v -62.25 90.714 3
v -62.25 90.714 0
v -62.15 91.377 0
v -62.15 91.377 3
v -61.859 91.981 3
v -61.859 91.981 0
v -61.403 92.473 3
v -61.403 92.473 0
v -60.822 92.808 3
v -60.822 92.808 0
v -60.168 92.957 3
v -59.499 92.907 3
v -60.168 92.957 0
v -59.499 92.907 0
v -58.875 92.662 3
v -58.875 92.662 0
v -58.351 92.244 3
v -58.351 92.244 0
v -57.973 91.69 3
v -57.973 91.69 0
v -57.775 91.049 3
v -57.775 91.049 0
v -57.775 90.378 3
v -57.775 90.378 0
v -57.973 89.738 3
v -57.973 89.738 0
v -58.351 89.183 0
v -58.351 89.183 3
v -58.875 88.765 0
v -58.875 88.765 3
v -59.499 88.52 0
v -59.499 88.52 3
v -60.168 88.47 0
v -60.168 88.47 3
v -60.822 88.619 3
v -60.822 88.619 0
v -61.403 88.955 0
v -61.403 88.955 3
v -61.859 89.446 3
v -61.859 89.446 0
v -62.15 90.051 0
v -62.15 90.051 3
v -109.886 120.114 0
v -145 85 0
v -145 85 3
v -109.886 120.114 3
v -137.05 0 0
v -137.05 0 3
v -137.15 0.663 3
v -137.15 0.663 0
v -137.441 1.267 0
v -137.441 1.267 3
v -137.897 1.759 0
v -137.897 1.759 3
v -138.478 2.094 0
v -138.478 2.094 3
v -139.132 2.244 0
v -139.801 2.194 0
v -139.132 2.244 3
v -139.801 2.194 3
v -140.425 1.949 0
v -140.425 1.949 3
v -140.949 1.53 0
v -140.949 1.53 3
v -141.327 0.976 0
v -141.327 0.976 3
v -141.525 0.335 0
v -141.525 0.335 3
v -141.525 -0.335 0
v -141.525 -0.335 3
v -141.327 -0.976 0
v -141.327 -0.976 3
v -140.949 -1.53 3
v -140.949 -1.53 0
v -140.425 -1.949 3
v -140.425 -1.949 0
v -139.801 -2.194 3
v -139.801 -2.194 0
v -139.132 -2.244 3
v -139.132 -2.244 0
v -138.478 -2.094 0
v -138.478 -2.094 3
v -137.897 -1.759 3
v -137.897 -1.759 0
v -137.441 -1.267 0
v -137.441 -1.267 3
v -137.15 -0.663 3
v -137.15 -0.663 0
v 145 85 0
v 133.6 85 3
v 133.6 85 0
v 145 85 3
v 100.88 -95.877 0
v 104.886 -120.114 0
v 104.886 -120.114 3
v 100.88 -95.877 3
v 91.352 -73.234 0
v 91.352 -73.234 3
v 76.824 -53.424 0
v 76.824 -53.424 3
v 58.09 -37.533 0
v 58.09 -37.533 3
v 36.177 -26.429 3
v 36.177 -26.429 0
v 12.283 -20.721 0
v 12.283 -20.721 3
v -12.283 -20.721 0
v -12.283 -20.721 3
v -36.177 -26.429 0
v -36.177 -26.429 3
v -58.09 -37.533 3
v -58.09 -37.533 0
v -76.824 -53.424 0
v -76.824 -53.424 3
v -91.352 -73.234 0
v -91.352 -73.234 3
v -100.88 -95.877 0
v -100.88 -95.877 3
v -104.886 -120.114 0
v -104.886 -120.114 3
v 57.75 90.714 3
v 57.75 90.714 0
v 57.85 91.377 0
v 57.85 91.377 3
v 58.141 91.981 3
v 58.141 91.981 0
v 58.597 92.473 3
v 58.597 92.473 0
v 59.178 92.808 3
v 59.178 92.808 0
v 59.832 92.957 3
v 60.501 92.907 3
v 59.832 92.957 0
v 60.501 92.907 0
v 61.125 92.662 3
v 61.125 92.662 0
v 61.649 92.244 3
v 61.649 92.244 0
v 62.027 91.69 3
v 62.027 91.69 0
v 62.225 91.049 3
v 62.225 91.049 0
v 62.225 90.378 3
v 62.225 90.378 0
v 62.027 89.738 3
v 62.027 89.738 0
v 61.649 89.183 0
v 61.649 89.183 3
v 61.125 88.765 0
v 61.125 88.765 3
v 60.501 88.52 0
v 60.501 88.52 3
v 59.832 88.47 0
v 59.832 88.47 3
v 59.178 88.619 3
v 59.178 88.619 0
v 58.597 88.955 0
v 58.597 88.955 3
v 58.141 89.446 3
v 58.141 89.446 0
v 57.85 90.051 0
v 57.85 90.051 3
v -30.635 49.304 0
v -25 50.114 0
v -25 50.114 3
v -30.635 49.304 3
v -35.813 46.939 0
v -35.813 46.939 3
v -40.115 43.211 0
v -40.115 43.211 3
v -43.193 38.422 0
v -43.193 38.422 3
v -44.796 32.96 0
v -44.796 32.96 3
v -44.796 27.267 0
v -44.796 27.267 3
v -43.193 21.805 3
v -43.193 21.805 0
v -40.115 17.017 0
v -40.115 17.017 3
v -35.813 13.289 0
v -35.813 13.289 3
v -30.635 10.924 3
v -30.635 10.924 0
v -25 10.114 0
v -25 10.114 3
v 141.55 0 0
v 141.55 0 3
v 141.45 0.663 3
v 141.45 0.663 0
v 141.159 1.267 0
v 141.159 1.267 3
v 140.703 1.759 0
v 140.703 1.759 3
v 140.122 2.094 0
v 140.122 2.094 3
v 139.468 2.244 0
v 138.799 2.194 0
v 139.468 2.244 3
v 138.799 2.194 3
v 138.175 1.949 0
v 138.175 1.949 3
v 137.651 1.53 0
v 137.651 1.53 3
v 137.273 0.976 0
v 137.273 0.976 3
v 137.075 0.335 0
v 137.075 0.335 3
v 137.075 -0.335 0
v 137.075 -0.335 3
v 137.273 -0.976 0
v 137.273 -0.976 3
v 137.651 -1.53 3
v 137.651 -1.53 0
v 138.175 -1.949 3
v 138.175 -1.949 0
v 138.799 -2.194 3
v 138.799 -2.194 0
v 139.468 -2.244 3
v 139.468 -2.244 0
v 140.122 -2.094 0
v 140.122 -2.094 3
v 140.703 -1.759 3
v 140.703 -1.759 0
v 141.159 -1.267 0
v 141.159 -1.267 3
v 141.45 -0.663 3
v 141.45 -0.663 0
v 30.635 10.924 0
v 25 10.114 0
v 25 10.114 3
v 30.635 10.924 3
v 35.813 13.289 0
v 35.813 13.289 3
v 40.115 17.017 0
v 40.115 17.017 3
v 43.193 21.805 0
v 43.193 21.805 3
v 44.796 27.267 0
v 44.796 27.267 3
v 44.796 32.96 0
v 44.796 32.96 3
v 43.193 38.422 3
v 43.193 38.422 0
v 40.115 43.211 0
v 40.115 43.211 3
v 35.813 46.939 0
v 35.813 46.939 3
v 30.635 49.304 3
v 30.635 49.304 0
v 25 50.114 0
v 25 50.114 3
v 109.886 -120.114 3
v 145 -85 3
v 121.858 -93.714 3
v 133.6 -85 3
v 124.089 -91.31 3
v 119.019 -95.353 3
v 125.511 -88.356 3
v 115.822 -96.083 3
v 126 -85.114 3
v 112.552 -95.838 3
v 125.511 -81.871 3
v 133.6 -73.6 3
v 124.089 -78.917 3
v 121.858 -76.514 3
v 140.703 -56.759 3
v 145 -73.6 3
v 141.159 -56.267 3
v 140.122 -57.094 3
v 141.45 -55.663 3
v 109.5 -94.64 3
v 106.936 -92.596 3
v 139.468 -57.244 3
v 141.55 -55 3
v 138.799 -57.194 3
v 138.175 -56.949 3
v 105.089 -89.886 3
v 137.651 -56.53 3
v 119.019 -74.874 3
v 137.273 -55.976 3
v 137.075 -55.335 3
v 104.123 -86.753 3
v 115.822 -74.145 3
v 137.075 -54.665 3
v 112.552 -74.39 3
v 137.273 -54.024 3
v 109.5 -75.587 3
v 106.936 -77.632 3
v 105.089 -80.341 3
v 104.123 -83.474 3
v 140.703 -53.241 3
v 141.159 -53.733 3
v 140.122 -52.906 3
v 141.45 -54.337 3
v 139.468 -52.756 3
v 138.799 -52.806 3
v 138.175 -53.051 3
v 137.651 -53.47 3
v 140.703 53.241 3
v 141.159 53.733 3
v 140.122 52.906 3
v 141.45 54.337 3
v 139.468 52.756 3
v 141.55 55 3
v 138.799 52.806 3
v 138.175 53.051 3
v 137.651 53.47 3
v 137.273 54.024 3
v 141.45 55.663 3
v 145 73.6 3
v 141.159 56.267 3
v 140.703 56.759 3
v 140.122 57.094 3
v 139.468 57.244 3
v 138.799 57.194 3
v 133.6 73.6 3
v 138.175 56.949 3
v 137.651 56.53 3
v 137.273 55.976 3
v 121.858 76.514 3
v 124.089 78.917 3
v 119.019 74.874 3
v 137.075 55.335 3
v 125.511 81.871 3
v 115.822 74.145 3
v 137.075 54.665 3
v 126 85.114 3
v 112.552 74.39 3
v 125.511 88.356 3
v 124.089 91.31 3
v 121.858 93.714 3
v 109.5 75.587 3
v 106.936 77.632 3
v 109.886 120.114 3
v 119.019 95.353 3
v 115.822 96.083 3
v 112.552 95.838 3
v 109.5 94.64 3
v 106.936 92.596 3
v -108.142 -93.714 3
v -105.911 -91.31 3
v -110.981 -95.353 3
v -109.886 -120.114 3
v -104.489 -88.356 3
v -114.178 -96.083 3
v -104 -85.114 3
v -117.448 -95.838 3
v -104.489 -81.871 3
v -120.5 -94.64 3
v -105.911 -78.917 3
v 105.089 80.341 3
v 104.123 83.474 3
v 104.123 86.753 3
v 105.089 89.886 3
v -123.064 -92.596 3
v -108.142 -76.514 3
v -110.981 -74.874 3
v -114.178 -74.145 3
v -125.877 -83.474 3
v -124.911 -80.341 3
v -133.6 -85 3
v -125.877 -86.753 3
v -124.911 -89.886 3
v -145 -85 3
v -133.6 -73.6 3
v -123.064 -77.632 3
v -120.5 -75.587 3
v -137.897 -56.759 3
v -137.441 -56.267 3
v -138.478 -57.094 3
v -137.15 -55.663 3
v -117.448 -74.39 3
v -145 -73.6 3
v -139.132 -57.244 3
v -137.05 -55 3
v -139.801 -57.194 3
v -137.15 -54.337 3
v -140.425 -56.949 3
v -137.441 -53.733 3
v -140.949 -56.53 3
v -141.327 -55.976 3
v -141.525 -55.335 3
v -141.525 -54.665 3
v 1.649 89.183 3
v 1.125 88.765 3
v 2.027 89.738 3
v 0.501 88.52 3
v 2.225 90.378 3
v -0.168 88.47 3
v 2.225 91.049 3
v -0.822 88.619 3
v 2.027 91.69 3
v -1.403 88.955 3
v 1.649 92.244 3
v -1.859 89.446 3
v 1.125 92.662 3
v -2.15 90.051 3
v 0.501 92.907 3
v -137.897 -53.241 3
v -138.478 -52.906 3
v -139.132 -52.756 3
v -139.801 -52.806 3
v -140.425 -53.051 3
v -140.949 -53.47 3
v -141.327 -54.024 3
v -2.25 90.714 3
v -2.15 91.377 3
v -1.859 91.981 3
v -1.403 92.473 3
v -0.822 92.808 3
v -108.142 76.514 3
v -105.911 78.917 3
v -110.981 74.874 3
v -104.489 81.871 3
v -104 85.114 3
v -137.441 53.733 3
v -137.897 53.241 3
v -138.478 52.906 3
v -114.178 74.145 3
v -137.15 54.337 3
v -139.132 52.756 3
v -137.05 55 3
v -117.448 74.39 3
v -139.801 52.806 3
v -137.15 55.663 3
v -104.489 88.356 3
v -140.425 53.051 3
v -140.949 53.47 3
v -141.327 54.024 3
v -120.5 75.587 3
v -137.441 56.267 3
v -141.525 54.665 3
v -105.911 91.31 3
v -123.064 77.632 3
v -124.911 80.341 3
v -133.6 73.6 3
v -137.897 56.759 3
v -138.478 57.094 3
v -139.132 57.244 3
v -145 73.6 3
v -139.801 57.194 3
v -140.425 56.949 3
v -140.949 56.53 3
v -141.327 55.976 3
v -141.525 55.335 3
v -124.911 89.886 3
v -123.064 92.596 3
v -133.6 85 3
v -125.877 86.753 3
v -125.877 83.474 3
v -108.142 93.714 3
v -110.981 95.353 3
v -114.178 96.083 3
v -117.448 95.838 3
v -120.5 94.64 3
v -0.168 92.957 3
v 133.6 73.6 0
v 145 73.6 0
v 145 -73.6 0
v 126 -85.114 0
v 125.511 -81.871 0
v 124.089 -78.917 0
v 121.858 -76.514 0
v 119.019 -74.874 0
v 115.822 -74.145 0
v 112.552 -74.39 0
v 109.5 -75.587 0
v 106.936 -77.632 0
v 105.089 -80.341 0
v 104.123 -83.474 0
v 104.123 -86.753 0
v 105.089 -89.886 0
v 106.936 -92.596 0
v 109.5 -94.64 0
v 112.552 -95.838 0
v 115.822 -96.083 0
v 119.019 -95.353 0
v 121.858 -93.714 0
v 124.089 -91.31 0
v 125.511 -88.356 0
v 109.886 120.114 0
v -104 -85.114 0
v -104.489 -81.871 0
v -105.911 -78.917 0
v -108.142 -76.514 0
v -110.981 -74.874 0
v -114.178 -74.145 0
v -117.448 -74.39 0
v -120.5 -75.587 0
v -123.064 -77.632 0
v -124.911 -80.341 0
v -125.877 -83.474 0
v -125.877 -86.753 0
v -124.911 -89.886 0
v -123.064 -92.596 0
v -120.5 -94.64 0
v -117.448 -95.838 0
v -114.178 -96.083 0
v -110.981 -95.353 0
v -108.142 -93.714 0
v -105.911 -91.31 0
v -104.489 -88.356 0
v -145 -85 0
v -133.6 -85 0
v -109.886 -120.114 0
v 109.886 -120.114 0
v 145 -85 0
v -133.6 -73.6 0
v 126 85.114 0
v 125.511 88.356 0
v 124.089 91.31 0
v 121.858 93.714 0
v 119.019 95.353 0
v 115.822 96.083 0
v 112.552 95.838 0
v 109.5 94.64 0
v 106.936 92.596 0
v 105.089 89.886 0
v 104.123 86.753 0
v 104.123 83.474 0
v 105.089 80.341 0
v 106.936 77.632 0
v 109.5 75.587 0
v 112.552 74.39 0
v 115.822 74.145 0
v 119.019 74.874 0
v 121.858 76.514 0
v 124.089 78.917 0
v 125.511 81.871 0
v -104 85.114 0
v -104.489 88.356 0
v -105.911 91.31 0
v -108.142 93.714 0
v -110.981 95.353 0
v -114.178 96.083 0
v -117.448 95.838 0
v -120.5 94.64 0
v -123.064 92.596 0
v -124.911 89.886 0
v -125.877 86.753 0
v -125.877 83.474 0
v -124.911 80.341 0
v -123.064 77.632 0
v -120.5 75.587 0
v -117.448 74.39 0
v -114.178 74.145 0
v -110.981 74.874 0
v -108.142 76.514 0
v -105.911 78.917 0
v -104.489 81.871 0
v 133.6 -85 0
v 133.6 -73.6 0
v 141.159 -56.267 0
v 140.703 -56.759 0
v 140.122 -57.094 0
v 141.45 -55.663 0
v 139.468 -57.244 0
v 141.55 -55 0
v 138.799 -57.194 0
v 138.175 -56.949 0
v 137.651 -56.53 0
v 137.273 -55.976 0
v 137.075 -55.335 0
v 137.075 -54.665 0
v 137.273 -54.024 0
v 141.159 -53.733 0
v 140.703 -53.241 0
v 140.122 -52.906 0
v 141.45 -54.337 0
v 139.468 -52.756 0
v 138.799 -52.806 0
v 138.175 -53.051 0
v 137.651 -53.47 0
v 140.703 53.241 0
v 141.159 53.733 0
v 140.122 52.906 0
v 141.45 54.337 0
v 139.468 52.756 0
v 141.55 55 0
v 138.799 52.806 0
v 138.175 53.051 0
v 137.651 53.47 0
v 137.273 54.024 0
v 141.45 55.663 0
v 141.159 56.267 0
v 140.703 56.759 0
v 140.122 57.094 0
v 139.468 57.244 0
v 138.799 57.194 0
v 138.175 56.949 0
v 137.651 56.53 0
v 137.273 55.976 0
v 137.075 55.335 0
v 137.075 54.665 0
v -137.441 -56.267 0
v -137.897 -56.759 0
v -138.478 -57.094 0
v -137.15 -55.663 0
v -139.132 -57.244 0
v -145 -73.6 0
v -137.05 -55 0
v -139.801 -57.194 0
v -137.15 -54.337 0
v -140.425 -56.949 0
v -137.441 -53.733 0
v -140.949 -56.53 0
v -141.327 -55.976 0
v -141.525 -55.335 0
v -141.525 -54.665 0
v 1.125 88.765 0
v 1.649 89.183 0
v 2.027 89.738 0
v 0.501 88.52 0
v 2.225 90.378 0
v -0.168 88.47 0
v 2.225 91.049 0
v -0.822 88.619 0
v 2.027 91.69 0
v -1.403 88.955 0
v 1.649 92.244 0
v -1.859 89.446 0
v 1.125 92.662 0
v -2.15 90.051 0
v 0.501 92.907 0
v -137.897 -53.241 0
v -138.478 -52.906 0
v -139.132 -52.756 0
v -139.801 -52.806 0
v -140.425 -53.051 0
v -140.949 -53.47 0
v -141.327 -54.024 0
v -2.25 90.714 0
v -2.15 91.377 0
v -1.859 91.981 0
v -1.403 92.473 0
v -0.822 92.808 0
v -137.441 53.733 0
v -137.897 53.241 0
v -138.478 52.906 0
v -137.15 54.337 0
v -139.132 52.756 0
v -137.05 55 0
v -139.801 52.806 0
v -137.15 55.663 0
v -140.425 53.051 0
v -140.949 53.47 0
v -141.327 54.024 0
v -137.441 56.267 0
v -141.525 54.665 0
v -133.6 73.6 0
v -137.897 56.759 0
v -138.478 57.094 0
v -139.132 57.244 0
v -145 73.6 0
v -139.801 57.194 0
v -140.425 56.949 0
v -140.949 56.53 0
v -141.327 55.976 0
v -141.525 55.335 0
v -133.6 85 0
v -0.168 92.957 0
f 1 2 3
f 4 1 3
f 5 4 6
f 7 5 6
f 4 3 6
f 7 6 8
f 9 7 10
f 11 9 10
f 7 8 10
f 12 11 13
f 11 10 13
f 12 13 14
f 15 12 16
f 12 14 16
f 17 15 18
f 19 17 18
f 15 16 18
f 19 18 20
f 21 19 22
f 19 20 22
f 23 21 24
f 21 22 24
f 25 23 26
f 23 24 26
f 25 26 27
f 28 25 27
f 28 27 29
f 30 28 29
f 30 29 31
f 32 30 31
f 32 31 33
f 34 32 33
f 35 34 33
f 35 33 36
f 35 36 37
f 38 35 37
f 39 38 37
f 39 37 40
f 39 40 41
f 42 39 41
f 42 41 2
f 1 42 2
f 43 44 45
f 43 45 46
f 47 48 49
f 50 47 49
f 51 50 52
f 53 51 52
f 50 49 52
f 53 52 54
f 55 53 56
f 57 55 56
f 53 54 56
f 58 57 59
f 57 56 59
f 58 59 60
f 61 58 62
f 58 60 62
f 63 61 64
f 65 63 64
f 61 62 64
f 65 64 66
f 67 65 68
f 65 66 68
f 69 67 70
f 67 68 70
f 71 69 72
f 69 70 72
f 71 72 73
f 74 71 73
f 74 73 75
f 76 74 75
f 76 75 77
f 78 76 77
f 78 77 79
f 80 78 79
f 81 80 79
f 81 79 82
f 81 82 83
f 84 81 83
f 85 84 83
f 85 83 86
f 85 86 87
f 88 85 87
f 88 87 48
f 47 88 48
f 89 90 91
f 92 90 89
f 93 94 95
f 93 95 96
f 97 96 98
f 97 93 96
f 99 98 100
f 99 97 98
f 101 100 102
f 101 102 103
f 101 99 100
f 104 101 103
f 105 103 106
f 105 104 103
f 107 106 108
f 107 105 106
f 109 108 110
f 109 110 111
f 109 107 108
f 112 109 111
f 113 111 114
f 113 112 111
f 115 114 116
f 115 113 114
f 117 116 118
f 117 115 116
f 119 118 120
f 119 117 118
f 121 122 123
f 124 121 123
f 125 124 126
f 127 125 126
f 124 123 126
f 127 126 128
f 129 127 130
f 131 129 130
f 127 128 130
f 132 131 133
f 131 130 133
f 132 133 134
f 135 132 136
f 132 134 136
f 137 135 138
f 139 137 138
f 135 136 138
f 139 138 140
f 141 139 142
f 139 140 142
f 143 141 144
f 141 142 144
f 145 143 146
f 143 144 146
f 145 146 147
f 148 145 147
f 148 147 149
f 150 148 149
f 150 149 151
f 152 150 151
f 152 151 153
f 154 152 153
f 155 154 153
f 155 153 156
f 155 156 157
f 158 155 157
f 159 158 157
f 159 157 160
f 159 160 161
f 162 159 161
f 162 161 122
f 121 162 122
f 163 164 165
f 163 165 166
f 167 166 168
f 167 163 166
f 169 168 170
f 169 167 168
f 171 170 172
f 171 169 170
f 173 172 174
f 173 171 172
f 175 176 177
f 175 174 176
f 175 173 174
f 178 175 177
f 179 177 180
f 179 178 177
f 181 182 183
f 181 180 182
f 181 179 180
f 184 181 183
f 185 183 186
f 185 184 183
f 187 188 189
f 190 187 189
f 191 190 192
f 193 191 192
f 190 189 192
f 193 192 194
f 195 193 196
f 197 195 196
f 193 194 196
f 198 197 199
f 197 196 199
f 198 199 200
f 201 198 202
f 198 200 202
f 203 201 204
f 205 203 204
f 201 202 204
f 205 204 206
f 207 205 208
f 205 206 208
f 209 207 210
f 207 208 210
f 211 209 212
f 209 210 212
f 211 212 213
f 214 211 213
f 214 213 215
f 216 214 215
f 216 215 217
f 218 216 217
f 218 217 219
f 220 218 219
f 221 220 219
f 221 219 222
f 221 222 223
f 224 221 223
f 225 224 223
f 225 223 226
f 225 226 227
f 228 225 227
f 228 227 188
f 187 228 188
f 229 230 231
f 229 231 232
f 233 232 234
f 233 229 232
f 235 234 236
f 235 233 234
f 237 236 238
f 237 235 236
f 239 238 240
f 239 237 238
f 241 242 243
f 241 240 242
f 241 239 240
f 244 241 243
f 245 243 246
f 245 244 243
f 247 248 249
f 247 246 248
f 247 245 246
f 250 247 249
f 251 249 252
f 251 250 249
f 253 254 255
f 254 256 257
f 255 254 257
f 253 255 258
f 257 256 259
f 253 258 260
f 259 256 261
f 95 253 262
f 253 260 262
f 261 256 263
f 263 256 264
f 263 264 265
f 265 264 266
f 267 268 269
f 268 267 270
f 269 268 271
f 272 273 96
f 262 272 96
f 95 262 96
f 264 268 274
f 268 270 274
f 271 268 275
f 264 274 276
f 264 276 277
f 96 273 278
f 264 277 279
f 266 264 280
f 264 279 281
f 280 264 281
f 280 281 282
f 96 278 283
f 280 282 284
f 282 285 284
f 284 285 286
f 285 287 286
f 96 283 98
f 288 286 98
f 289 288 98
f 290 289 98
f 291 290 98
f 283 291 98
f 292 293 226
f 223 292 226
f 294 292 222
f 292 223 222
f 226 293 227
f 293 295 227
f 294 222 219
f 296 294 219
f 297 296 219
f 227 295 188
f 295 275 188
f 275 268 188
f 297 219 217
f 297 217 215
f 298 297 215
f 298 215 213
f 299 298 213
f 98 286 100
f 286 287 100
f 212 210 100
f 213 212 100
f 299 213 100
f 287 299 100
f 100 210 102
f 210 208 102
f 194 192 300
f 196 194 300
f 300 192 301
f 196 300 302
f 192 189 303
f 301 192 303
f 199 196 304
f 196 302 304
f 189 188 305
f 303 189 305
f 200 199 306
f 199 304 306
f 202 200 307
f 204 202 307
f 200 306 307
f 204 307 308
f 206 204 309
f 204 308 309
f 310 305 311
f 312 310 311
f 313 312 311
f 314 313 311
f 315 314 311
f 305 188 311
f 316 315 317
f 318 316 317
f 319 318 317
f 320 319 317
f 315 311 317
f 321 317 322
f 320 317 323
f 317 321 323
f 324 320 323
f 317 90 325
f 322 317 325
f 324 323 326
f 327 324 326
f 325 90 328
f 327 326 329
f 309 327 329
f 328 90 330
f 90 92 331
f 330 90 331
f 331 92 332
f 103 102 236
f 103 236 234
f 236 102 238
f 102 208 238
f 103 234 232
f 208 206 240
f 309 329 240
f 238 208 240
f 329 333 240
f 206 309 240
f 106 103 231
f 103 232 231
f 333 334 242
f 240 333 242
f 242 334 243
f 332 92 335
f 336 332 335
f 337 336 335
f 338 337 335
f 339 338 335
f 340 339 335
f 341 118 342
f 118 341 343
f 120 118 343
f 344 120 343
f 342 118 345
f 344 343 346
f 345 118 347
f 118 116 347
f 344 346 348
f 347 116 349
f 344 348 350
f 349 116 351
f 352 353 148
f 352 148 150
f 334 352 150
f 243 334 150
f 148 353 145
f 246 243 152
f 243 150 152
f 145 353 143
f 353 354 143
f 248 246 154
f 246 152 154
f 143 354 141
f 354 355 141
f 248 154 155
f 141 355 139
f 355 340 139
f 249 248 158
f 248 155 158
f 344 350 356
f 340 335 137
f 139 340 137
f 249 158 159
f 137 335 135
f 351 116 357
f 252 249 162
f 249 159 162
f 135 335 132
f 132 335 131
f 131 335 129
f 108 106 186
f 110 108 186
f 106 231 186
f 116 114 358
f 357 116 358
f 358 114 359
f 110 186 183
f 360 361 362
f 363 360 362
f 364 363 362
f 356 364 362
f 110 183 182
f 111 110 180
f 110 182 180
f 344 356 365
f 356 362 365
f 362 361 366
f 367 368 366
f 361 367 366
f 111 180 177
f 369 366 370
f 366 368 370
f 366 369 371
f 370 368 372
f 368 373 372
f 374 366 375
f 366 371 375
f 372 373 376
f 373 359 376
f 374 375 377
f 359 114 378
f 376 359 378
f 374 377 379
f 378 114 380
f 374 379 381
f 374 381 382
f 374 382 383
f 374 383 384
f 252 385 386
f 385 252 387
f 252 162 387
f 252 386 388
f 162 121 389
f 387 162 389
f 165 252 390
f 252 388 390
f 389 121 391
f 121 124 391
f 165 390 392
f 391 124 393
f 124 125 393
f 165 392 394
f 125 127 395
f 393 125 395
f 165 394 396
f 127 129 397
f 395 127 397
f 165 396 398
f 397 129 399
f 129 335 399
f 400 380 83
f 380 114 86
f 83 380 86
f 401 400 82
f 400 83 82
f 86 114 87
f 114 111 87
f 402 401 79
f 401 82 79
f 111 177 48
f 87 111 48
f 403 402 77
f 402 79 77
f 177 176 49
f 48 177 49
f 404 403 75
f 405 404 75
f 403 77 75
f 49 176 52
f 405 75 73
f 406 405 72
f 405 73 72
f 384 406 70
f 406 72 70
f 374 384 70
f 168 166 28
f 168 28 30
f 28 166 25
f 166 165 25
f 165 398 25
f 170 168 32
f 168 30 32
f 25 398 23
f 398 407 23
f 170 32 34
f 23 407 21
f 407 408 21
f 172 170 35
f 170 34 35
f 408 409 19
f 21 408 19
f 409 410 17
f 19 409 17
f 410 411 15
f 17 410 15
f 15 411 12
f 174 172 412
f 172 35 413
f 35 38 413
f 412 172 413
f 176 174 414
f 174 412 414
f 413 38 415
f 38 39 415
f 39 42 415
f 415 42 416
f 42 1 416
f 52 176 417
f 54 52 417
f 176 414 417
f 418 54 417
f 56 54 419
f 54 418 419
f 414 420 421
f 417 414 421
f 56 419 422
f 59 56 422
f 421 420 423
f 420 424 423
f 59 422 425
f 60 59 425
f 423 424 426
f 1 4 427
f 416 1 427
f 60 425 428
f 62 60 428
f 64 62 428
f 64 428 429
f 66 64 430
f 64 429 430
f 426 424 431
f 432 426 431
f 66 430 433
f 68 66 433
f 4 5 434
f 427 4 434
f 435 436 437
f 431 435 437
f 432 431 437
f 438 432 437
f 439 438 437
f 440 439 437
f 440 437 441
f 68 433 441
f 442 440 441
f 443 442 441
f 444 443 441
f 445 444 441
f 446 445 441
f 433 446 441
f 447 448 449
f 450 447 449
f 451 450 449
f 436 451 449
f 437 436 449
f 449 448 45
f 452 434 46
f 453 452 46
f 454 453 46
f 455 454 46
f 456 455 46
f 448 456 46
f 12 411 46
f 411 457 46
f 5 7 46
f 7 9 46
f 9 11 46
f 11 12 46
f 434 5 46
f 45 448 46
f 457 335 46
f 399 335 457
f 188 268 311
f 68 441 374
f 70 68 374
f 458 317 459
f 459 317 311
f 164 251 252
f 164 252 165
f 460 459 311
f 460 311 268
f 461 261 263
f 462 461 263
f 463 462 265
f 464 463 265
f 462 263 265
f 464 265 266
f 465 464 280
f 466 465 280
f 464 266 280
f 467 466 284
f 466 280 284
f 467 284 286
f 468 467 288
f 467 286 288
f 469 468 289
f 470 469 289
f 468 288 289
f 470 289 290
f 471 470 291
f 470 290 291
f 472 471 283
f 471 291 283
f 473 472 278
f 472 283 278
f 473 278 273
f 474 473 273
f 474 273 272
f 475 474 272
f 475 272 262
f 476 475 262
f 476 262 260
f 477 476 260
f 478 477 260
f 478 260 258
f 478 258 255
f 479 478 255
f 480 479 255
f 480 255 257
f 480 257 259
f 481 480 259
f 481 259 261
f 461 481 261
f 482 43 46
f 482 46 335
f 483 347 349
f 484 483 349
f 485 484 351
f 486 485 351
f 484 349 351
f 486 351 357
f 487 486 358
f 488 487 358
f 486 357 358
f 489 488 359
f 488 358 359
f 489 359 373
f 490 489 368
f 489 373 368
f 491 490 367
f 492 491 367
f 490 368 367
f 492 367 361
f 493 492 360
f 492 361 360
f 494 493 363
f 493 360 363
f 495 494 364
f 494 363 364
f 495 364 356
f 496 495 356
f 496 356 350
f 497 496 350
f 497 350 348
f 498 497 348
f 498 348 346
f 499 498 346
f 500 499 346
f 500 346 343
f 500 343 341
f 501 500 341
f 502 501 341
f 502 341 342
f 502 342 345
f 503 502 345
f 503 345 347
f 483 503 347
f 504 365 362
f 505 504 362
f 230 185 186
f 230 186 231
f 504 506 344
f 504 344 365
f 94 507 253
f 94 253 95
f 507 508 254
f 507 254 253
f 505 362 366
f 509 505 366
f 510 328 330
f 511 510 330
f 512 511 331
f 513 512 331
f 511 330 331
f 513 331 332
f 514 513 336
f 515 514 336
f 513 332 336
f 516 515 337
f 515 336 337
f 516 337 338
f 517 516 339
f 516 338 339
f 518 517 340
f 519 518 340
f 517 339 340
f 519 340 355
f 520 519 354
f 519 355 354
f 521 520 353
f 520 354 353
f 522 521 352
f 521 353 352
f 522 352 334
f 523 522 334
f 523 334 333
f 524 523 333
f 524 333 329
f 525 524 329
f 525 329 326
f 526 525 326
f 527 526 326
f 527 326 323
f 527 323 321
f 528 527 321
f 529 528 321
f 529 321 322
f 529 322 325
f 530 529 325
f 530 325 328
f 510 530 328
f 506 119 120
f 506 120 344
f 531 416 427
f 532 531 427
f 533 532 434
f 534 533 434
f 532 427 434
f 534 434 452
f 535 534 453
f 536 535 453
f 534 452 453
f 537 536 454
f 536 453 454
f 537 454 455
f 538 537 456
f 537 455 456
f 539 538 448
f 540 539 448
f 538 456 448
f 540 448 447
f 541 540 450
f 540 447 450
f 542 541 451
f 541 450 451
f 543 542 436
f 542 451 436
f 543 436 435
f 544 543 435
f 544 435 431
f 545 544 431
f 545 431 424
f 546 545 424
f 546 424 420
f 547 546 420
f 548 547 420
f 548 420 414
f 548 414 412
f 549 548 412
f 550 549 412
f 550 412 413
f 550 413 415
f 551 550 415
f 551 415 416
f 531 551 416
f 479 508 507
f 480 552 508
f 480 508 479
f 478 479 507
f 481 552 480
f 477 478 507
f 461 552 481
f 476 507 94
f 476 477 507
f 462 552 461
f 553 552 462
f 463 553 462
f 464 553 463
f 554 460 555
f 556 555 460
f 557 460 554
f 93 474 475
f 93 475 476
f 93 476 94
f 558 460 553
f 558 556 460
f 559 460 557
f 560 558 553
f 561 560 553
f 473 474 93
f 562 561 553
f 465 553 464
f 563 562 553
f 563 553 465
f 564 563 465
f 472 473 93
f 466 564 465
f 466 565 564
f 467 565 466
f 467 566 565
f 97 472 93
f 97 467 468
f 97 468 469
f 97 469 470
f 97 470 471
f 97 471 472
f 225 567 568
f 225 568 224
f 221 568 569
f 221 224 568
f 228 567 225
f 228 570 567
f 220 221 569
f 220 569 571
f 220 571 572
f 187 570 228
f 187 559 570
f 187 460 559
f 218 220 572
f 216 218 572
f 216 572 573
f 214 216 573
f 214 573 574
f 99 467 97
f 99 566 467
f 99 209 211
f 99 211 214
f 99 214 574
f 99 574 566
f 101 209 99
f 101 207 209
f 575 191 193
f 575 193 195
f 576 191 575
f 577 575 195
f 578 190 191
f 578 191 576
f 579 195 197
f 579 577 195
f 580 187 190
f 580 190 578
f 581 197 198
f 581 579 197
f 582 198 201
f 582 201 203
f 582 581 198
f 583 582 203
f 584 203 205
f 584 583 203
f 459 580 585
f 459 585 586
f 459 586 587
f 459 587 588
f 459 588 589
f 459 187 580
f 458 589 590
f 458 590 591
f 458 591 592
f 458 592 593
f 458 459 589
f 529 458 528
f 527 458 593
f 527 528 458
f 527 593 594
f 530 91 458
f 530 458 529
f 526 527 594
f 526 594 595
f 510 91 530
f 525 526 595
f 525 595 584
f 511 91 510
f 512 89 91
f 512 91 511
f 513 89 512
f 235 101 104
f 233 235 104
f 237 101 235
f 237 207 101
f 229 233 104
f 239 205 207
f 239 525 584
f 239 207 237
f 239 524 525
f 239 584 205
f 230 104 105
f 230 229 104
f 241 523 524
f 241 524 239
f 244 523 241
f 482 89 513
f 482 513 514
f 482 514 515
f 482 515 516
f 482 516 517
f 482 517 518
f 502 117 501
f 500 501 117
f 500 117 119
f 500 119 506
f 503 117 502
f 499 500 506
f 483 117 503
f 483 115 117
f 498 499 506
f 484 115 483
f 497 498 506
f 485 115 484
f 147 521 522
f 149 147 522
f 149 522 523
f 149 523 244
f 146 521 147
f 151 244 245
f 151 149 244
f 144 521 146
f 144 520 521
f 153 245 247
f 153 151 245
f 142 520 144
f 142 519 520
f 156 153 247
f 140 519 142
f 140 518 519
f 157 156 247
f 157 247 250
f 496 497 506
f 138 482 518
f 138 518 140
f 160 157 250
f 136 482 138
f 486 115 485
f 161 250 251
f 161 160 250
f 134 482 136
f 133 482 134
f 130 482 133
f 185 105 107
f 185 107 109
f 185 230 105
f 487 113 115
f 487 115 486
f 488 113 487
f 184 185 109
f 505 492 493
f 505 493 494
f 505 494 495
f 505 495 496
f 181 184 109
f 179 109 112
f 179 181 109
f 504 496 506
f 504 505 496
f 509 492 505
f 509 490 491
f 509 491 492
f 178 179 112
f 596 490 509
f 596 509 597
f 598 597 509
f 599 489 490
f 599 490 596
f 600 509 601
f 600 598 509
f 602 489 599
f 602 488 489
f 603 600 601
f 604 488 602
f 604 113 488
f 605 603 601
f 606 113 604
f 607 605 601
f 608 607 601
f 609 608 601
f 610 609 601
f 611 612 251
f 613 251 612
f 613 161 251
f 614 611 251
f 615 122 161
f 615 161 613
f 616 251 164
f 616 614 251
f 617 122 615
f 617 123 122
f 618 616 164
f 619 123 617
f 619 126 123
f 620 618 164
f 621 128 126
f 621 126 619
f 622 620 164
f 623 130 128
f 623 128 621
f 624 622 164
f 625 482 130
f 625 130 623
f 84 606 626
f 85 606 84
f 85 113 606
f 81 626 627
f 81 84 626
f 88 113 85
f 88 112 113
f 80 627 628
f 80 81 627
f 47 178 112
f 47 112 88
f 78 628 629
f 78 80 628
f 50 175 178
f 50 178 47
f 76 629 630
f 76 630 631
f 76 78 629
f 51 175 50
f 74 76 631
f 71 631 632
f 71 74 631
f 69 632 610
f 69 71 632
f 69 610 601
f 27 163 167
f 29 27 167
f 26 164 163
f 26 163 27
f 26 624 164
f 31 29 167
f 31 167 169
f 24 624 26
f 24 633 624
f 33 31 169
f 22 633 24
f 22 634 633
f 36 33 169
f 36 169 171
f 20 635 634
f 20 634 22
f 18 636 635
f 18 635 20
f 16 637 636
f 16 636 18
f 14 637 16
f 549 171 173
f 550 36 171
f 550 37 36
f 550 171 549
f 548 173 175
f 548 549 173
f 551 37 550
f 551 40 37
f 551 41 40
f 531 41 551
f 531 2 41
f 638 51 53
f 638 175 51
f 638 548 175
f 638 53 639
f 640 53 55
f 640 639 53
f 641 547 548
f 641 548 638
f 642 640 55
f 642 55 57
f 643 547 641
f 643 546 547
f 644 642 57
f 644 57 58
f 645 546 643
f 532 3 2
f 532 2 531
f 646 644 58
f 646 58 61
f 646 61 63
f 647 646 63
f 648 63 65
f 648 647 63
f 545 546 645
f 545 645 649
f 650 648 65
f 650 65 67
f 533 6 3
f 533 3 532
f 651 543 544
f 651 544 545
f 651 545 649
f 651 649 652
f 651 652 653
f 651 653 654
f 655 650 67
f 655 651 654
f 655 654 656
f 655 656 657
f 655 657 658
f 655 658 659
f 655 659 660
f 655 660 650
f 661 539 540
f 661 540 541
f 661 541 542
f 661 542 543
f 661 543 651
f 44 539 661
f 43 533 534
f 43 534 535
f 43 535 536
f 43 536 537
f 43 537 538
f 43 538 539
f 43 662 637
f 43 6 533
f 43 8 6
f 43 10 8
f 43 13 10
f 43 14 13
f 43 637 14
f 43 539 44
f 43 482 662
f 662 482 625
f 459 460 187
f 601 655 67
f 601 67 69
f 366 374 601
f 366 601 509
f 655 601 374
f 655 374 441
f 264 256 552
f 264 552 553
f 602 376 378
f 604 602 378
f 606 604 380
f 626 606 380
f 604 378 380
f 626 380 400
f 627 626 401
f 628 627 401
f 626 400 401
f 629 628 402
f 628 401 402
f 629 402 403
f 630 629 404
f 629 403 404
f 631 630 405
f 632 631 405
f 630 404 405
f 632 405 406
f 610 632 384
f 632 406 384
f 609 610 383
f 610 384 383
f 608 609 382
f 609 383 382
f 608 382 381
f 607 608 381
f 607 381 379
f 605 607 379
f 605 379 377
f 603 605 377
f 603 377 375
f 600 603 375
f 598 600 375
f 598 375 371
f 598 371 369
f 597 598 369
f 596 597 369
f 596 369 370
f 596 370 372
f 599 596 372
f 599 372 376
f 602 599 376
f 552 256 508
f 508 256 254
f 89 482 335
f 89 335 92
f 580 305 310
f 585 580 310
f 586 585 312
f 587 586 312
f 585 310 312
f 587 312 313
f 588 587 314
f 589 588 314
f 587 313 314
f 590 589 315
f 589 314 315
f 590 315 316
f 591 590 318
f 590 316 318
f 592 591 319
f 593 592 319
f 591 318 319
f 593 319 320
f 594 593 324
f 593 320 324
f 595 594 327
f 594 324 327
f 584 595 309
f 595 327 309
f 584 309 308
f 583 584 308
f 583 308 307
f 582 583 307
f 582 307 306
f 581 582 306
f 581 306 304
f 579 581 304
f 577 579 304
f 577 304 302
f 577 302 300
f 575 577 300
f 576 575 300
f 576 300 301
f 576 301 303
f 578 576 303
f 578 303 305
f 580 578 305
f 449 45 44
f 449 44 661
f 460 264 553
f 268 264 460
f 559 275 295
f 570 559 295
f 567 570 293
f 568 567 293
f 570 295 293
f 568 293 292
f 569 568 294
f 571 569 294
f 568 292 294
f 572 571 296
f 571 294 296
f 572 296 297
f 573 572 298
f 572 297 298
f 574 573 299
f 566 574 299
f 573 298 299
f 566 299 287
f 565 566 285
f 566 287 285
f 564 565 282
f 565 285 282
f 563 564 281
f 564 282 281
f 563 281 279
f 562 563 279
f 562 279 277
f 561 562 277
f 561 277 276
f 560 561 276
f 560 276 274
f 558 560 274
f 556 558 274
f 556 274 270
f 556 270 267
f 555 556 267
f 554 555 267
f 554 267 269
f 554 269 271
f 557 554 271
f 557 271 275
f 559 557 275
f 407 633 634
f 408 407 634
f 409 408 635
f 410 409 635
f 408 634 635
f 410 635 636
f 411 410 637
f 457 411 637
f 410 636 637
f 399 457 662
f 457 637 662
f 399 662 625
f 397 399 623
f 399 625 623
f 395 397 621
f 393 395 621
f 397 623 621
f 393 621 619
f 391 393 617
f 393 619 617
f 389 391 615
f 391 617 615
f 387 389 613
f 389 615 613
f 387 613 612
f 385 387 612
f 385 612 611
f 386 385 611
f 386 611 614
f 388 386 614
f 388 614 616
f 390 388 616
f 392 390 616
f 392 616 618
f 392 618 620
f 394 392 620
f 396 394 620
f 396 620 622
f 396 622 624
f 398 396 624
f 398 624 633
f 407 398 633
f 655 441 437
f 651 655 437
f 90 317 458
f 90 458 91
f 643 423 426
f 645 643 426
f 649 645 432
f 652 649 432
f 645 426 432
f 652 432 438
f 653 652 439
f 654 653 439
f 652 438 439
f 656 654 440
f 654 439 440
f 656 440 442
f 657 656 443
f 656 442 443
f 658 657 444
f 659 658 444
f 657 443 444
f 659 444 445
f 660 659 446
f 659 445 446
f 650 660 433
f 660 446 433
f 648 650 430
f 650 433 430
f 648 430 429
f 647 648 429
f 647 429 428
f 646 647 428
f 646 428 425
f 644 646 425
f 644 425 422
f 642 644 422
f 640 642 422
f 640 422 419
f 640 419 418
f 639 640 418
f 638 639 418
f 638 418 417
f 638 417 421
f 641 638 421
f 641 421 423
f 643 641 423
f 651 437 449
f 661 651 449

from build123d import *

# Parameters (mm, degrees)
BOSS_EXTRU_1_DEPTH      = 3
ESQUISSE21_W            = 11.4
ESQUISSE21_H            = 11.4
ENL_V_MAT_EXTRU_3_DEPTH = 4
D_GAGEMENT_M41_D        = 4.5
D_GAGEMENT_M42_D        = 4.5
D_GAGEMENT_M201_D       = 22
ENL_V_MAT_EXTRU_4_DEPTH = 4


with BuildPart() as part:
    # Esquisse1 → Boss.-Extru.1 (new body)
    with BuildSketch(Plane.XY):
        with BuildLine():
            Line((-145, 85), (-109.886246, 120.113754))
            Line((-109.886246, 120.113754), (109.886246, 120.113754))
            Line((109.886246, 120.113754), (145, 85))
            Line((145, 85), (145, -85))
            Line((145, -85), (109.886246, -120.113754))
            Line((109.886246, -120.113754), (104.886246, -120.113754))
            ThreePointArc((104.886246, -120.113754), (0, -20), (-104.886246, -120.113754))
            Line((-104.886246, -120.113754), (-109.886246, -120.113754))
            Line((-109.886246, -120.113754), (-145, -85))
            Line((-145, -85), (-145, 85))
        make_face()
    extrude(amount=BOSS_EXTRU_1_DEPTH)

    # Esquisse21 → Enlèv. mat.-Extru.3 (cut, through all)
    with BuildSketch(Plane.XY.offset(3)):
        with Locations((-139.3, 79.3)):
            Rectangle(ESQUISSE21_W, ESQUISSE21_H)
        with Locations((139.3, 79.3)):
            Rectangle(ESQUISSE21_W, ESQUISSE21_H)
        with Locations((-139.3, -79.3)):
            Rectangle(ESQUISSE21_W, ESQUISSE21_H)
        with Locations((139.3, -79.3)):
            Rectangle(ESQUISSE21_W, ESQUISSE21_H)
    extrude(amount=-ENL_V_MAT_EXTRU_3_DEPTH, mode=Mode.SUBTRACT)

    # Dégagement M41 (through all)
    with Locations(Plane(origin=(0, 0, 0), x_dir=(-1, 0, 0), z_dir=(0, 0, -1))):
        with Locations((-139.3, 55), (-139.3, 0), (-139.3, -55), (139.3, 55), (139.3, 0), (139.3, -55)):
            Hole(D_GAGEMENT_M41_D / 2)

    # Dégagement M42 (through all)
    with Locations(Plane.XY.offset(3)):
        with Locations((-60, 90.713754), (0, 90.713754), (60, 90.713754)):
            Hole(D_GAGEMENT_M42_D / 2)

    # Dégagement M201 (through all)
    with Locations(Plane(origin=(0, 0, 0), x_dir=(-1, 0, 0), z_dir=(0, 0, -1))):
        with Locations((-115, 85.113754), (-115, -85.113754), (115, 85.113754), (115, -85.113754)):
            Hole(D_GAGEMENT_M201_D / 2)

    # Esquisse46 → Enlèv. mat.-Extru.4 (cut, through all)
    with BuildSketch(Plane(origin=(0, 0, 0), x_dir=(-1, 0, 0), z_dir=(0, 0, -1))):
        with BuildLine():
            Line((-25, 50.113754), (25, 50.113754))
            ThreePointArc((25, 50.113754), (45, 30.113754), (25, 10.113754))
            Line((25, 10.113754), (-25, 10.113754))
            ThreePointArc((-25, 10.113754), (-45, 30.113754), (-25, 50.113754))
        make_face()
    extrude(amount=-ENL_V_MAT_EXTRU_4_DEPTH, mode=Mode.SUBTRACT)


solid = part.part
